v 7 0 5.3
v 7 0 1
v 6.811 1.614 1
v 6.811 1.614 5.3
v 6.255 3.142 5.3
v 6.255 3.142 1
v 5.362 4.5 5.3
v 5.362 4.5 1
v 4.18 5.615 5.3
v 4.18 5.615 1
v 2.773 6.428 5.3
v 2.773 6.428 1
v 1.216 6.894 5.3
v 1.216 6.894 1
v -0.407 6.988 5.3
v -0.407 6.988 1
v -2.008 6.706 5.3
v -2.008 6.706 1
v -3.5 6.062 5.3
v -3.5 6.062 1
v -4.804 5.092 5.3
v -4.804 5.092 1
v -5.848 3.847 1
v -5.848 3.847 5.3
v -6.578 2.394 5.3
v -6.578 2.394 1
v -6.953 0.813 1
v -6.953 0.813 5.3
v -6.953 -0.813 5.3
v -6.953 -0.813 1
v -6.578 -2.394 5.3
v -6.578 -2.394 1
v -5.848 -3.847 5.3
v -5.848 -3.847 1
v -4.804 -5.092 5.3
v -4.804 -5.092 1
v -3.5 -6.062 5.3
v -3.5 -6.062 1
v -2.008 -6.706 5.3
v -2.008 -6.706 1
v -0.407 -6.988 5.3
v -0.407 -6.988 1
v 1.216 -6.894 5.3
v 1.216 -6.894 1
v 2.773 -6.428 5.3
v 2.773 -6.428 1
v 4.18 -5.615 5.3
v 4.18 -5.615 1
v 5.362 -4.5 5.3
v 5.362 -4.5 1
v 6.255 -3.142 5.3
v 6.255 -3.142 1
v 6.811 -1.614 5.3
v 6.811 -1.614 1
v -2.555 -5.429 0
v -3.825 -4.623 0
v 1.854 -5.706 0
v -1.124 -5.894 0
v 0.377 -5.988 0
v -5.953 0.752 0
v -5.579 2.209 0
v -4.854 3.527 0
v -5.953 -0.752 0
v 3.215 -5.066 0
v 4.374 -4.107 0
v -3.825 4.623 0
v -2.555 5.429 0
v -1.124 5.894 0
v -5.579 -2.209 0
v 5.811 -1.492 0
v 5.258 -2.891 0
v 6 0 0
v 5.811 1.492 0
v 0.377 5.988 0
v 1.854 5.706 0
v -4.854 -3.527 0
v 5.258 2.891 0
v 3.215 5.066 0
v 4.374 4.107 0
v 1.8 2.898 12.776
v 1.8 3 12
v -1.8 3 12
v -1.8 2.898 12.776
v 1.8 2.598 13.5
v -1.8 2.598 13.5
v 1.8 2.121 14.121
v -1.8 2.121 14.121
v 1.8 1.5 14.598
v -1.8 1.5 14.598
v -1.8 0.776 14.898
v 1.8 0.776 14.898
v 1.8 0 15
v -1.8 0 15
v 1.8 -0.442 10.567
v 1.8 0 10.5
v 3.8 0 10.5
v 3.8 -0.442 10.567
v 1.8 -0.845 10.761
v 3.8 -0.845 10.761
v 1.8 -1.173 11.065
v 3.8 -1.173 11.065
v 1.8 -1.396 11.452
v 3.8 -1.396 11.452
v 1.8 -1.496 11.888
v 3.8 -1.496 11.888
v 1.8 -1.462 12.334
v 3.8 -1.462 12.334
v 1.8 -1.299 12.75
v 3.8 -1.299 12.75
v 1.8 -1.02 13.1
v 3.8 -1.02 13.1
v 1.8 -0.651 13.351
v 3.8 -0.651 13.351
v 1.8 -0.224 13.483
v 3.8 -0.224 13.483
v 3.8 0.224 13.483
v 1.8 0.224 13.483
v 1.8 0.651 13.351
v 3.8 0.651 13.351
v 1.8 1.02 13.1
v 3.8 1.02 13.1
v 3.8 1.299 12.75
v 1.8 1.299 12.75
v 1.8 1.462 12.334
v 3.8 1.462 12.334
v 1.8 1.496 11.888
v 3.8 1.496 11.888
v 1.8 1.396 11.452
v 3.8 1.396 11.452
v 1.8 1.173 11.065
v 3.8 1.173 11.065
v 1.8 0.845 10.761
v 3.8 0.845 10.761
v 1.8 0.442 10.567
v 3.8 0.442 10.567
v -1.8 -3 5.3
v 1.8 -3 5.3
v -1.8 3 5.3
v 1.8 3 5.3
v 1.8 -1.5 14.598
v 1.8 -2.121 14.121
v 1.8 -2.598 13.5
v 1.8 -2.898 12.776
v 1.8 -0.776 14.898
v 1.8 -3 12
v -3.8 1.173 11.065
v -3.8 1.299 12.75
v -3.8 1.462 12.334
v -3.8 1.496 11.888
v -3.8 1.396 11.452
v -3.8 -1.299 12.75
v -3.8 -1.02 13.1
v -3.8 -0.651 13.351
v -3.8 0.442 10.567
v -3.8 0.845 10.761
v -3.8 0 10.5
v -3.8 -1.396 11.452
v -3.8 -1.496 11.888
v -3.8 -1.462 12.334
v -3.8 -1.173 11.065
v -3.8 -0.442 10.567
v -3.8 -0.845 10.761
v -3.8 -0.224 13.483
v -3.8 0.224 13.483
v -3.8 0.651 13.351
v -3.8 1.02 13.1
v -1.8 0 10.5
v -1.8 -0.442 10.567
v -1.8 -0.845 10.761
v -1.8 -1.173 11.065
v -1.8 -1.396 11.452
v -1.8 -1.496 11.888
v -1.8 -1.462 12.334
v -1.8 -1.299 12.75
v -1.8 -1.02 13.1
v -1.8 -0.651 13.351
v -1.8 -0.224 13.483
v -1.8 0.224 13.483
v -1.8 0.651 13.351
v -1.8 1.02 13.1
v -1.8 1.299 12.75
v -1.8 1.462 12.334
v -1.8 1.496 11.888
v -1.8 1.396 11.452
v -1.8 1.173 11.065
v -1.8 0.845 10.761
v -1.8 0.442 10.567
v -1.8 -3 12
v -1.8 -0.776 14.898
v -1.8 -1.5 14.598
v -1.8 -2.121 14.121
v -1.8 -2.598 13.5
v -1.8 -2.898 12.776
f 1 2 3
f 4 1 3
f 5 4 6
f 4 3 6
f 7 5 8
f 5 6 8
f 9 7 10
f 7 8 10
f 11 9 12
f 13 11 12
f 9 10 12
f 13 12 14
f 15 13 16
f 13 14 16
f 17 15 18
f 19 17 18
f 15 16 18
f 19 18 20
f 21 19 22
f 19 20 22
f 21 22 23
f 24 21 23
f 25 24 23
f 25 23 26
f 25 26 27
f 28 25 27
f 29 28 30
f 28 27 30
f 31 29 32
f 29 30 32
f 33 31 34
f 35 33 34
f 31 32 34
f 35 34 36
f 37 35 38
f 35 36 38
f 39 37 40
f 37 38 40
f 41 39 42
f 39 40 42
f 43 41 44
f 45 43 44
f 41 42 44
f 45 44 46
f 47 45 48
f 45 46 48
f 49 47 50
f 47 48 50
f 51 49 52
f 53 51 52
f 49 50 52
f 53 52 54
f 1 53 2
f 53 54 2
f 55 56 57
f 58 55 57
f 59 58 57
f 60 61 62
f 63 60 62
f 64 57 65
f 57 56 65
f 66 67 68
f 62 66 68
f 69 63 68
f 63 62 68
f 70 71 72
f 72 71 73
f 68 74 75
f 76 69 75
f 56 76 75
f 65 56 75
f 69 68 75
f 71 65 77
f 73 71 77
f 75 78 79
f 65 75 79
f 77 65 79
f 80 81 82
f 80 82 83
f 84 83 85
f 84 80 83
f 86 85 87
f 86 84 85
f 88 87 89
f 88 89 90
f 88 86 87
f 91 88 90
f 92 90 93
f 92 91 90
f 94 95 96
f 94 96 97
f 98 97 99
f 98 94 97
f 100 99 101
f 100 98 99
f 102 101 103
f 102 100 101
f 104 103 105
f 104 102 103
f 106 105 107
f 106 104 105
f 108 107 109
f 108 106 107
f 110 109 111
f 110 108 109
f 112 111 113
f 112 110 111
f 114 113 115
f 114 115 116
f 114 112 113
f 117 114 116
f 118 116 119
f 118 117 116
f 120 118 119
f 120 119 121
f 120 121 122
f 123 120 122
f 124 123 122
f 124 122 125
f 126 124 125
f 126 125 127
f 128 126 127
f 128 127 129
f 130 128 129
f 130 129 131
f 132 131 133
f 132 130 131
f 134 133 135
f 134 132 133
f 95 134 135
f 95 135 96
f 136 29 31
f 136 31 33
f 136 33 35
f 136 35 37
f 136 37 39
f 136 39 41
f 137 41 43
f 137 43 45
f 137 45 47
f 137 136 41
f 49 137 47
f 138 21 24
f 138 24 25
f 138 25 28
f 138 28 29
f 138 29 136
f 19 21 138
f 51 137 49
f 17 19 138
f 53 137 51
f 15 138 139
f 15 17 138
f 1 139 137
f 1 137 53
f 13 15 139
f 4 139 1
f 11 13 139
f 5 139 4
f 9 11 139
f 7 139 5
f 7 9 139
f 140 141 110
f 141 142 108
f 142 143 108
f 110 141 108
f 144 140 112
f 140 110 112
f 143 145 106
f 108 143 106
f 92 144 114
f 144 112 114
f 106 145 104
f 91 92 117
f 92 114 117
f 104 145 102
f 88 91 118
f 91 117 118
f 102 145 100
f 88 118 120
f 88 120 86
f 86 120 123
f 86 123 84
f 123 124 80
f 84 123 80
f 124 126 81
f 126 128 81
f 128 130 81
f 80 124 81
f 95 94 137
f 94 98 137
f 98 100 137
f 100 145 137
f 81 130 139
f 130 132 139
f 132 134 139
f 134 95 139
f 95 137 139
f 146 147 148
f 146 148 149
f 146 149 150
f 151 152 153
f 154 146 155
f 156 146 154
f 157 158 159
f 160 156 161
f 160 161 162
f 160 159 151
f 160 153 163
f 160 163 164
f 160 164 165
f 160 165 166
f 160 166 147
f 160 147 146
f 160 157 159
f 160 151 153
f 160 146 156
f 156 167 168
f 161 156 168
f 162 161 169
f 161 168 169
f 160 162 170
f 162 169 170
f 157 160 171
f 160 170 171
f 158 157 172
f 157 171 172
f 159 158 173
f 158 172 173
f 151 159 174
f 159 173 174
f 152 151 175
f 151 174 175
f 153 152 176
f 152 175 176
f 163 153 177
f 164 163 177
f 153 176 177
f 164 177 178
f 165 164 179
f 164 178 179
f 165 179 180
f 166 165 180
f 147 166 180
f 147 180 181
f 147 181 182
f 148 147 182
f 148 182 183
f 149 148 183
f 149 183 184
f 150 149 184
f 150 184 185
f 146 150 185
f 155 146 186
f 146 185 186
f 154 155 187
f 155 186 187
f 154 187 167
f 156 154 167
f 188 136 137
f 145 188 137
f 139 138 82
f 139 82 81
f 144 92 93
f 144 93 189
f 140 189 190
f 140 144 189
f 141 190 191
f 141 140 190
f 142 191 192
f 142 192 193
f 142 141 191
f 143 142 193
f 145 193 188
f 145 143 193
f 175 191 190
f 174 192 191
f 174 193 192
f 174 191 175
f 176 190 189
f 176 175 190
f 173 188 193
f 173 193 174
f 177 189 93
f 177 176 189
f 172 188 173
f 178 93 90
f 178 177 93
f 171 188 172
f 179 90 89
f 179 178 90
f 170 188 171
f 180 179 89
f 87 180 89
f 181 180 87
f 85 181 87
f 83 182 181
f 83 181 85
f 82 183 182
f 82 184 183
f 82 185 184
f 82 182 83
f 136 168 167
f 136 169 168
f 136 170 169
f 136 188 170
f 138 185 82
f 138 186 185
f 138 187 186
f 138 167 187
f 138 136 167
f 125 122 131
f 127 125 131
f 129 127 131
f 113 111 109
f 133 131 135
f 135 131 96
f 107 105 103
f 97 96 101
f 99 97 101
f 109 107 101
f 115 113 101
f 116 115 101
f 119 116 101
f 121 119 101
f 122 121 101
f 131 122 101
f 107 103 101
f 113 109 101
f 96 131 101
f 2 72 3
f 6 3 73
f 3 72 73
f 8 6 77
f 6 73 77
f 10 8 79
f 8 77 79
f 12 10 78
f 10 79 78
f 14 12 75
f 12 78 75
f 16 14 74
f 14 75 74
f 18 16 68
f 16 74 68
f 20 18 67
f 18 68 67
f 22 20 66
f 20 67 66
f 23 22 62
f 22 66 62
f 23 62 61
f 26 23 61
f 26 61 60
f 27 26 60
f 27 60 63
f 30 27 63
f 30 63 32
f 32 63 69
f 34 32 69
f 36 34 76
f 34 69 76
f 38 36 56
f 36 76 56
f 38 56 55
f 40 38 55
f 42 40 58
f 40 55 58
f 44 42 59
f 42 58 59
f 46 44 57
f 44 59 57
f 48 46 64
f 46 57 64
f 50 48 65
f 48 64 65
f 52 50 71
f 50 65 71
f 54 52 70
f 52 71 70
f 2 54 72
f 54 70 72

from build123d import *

# Parameters (mm, degrees)
SKETCH_1_R          = 7
EXTRUDE_1_DEPTH     = 5.3
SKETCH_2_W          = 3.6
SKETCH_2_H          = 6
EXTRUDE_2_DEPTH     = 9.7
CUT_EXTRUDE_START   = -3.6
CUT_EXTRUDE_1_DEPTH = 3.6
CHAMFER_1_SIZE      = 1
SKETCH_4_R          = 1.5
EXTRUDE_3_DEPTH     = 2


# Read off the part's stored shape, not the designer's step: 切除-拉伸1
with BuildPart() as part:
    # 草图1 → 凸台-拉伸1 (new body)
    with BuildSketch(Plane.XY):
        Circle(SKETCH_1_R)
    extrude(amount=EXTRUDE_1_DEPTH)

    # 草图2 → 凸台-拉伸2 (add)
    with BuildSketch(Plane.XY.offset(5.3)):
        Rectangle(SKETCH_2_W, SKETCH_2_H)
    extrude(amount=EXTRUDE_2_DEPTH)

    # 切除-拉伸1 outline → 切除-拉伸1 (cut)
    with BuildSketch(Plane.ZY.offset(1.8).offset(CUT_EXTRUDE_START)):
        with BuildLine():
            Line((15, 3), (12, 3))
            ThreePointArc((12, 3), (14.121320344, 2.121320344), (15, 0))
            Line((15, 0), (15, 3))
        make_face()
        with BuildLine():
            Line((15, -3), (15, 0))
            ThreePointArc((15, 0), (14.121320344, -2.121320344), (12, -3))
            Line((12, -3), (15, -3))
        make_face()
    extrude(amount=CUT_EXTRUDE_1_DEPTH, mode=Mode.SUBTRACT)

    # 倒角1
    chamfer_1_edges = [part.edges().sort_by_distance(p)[0] for p in [
        (-7, 0, 0),
    ]]
    chamfer(chamfer_1_edges, length=CHAMFER_1_SIZE)

    # 草图4 → 凸台-拉伸3 (add)
    with BuildSketch(Plane.ZY.offset(1.8)):
        with Locations(Location((12, 0, 0), (0, 0, 180))):
            Circle(SKETCH_4_R)
    extrude_3 = extrude(amount=EXTRUDE_3_DEPTH)

    # 镜向1: 凸台-拉伸3 across plane
    add(extrude_3.mirror(Plane(origin=(0, 0, 0), x_dir=(0, 0, 1), z_dir=(1, 0, 0))))


solid = part.part
